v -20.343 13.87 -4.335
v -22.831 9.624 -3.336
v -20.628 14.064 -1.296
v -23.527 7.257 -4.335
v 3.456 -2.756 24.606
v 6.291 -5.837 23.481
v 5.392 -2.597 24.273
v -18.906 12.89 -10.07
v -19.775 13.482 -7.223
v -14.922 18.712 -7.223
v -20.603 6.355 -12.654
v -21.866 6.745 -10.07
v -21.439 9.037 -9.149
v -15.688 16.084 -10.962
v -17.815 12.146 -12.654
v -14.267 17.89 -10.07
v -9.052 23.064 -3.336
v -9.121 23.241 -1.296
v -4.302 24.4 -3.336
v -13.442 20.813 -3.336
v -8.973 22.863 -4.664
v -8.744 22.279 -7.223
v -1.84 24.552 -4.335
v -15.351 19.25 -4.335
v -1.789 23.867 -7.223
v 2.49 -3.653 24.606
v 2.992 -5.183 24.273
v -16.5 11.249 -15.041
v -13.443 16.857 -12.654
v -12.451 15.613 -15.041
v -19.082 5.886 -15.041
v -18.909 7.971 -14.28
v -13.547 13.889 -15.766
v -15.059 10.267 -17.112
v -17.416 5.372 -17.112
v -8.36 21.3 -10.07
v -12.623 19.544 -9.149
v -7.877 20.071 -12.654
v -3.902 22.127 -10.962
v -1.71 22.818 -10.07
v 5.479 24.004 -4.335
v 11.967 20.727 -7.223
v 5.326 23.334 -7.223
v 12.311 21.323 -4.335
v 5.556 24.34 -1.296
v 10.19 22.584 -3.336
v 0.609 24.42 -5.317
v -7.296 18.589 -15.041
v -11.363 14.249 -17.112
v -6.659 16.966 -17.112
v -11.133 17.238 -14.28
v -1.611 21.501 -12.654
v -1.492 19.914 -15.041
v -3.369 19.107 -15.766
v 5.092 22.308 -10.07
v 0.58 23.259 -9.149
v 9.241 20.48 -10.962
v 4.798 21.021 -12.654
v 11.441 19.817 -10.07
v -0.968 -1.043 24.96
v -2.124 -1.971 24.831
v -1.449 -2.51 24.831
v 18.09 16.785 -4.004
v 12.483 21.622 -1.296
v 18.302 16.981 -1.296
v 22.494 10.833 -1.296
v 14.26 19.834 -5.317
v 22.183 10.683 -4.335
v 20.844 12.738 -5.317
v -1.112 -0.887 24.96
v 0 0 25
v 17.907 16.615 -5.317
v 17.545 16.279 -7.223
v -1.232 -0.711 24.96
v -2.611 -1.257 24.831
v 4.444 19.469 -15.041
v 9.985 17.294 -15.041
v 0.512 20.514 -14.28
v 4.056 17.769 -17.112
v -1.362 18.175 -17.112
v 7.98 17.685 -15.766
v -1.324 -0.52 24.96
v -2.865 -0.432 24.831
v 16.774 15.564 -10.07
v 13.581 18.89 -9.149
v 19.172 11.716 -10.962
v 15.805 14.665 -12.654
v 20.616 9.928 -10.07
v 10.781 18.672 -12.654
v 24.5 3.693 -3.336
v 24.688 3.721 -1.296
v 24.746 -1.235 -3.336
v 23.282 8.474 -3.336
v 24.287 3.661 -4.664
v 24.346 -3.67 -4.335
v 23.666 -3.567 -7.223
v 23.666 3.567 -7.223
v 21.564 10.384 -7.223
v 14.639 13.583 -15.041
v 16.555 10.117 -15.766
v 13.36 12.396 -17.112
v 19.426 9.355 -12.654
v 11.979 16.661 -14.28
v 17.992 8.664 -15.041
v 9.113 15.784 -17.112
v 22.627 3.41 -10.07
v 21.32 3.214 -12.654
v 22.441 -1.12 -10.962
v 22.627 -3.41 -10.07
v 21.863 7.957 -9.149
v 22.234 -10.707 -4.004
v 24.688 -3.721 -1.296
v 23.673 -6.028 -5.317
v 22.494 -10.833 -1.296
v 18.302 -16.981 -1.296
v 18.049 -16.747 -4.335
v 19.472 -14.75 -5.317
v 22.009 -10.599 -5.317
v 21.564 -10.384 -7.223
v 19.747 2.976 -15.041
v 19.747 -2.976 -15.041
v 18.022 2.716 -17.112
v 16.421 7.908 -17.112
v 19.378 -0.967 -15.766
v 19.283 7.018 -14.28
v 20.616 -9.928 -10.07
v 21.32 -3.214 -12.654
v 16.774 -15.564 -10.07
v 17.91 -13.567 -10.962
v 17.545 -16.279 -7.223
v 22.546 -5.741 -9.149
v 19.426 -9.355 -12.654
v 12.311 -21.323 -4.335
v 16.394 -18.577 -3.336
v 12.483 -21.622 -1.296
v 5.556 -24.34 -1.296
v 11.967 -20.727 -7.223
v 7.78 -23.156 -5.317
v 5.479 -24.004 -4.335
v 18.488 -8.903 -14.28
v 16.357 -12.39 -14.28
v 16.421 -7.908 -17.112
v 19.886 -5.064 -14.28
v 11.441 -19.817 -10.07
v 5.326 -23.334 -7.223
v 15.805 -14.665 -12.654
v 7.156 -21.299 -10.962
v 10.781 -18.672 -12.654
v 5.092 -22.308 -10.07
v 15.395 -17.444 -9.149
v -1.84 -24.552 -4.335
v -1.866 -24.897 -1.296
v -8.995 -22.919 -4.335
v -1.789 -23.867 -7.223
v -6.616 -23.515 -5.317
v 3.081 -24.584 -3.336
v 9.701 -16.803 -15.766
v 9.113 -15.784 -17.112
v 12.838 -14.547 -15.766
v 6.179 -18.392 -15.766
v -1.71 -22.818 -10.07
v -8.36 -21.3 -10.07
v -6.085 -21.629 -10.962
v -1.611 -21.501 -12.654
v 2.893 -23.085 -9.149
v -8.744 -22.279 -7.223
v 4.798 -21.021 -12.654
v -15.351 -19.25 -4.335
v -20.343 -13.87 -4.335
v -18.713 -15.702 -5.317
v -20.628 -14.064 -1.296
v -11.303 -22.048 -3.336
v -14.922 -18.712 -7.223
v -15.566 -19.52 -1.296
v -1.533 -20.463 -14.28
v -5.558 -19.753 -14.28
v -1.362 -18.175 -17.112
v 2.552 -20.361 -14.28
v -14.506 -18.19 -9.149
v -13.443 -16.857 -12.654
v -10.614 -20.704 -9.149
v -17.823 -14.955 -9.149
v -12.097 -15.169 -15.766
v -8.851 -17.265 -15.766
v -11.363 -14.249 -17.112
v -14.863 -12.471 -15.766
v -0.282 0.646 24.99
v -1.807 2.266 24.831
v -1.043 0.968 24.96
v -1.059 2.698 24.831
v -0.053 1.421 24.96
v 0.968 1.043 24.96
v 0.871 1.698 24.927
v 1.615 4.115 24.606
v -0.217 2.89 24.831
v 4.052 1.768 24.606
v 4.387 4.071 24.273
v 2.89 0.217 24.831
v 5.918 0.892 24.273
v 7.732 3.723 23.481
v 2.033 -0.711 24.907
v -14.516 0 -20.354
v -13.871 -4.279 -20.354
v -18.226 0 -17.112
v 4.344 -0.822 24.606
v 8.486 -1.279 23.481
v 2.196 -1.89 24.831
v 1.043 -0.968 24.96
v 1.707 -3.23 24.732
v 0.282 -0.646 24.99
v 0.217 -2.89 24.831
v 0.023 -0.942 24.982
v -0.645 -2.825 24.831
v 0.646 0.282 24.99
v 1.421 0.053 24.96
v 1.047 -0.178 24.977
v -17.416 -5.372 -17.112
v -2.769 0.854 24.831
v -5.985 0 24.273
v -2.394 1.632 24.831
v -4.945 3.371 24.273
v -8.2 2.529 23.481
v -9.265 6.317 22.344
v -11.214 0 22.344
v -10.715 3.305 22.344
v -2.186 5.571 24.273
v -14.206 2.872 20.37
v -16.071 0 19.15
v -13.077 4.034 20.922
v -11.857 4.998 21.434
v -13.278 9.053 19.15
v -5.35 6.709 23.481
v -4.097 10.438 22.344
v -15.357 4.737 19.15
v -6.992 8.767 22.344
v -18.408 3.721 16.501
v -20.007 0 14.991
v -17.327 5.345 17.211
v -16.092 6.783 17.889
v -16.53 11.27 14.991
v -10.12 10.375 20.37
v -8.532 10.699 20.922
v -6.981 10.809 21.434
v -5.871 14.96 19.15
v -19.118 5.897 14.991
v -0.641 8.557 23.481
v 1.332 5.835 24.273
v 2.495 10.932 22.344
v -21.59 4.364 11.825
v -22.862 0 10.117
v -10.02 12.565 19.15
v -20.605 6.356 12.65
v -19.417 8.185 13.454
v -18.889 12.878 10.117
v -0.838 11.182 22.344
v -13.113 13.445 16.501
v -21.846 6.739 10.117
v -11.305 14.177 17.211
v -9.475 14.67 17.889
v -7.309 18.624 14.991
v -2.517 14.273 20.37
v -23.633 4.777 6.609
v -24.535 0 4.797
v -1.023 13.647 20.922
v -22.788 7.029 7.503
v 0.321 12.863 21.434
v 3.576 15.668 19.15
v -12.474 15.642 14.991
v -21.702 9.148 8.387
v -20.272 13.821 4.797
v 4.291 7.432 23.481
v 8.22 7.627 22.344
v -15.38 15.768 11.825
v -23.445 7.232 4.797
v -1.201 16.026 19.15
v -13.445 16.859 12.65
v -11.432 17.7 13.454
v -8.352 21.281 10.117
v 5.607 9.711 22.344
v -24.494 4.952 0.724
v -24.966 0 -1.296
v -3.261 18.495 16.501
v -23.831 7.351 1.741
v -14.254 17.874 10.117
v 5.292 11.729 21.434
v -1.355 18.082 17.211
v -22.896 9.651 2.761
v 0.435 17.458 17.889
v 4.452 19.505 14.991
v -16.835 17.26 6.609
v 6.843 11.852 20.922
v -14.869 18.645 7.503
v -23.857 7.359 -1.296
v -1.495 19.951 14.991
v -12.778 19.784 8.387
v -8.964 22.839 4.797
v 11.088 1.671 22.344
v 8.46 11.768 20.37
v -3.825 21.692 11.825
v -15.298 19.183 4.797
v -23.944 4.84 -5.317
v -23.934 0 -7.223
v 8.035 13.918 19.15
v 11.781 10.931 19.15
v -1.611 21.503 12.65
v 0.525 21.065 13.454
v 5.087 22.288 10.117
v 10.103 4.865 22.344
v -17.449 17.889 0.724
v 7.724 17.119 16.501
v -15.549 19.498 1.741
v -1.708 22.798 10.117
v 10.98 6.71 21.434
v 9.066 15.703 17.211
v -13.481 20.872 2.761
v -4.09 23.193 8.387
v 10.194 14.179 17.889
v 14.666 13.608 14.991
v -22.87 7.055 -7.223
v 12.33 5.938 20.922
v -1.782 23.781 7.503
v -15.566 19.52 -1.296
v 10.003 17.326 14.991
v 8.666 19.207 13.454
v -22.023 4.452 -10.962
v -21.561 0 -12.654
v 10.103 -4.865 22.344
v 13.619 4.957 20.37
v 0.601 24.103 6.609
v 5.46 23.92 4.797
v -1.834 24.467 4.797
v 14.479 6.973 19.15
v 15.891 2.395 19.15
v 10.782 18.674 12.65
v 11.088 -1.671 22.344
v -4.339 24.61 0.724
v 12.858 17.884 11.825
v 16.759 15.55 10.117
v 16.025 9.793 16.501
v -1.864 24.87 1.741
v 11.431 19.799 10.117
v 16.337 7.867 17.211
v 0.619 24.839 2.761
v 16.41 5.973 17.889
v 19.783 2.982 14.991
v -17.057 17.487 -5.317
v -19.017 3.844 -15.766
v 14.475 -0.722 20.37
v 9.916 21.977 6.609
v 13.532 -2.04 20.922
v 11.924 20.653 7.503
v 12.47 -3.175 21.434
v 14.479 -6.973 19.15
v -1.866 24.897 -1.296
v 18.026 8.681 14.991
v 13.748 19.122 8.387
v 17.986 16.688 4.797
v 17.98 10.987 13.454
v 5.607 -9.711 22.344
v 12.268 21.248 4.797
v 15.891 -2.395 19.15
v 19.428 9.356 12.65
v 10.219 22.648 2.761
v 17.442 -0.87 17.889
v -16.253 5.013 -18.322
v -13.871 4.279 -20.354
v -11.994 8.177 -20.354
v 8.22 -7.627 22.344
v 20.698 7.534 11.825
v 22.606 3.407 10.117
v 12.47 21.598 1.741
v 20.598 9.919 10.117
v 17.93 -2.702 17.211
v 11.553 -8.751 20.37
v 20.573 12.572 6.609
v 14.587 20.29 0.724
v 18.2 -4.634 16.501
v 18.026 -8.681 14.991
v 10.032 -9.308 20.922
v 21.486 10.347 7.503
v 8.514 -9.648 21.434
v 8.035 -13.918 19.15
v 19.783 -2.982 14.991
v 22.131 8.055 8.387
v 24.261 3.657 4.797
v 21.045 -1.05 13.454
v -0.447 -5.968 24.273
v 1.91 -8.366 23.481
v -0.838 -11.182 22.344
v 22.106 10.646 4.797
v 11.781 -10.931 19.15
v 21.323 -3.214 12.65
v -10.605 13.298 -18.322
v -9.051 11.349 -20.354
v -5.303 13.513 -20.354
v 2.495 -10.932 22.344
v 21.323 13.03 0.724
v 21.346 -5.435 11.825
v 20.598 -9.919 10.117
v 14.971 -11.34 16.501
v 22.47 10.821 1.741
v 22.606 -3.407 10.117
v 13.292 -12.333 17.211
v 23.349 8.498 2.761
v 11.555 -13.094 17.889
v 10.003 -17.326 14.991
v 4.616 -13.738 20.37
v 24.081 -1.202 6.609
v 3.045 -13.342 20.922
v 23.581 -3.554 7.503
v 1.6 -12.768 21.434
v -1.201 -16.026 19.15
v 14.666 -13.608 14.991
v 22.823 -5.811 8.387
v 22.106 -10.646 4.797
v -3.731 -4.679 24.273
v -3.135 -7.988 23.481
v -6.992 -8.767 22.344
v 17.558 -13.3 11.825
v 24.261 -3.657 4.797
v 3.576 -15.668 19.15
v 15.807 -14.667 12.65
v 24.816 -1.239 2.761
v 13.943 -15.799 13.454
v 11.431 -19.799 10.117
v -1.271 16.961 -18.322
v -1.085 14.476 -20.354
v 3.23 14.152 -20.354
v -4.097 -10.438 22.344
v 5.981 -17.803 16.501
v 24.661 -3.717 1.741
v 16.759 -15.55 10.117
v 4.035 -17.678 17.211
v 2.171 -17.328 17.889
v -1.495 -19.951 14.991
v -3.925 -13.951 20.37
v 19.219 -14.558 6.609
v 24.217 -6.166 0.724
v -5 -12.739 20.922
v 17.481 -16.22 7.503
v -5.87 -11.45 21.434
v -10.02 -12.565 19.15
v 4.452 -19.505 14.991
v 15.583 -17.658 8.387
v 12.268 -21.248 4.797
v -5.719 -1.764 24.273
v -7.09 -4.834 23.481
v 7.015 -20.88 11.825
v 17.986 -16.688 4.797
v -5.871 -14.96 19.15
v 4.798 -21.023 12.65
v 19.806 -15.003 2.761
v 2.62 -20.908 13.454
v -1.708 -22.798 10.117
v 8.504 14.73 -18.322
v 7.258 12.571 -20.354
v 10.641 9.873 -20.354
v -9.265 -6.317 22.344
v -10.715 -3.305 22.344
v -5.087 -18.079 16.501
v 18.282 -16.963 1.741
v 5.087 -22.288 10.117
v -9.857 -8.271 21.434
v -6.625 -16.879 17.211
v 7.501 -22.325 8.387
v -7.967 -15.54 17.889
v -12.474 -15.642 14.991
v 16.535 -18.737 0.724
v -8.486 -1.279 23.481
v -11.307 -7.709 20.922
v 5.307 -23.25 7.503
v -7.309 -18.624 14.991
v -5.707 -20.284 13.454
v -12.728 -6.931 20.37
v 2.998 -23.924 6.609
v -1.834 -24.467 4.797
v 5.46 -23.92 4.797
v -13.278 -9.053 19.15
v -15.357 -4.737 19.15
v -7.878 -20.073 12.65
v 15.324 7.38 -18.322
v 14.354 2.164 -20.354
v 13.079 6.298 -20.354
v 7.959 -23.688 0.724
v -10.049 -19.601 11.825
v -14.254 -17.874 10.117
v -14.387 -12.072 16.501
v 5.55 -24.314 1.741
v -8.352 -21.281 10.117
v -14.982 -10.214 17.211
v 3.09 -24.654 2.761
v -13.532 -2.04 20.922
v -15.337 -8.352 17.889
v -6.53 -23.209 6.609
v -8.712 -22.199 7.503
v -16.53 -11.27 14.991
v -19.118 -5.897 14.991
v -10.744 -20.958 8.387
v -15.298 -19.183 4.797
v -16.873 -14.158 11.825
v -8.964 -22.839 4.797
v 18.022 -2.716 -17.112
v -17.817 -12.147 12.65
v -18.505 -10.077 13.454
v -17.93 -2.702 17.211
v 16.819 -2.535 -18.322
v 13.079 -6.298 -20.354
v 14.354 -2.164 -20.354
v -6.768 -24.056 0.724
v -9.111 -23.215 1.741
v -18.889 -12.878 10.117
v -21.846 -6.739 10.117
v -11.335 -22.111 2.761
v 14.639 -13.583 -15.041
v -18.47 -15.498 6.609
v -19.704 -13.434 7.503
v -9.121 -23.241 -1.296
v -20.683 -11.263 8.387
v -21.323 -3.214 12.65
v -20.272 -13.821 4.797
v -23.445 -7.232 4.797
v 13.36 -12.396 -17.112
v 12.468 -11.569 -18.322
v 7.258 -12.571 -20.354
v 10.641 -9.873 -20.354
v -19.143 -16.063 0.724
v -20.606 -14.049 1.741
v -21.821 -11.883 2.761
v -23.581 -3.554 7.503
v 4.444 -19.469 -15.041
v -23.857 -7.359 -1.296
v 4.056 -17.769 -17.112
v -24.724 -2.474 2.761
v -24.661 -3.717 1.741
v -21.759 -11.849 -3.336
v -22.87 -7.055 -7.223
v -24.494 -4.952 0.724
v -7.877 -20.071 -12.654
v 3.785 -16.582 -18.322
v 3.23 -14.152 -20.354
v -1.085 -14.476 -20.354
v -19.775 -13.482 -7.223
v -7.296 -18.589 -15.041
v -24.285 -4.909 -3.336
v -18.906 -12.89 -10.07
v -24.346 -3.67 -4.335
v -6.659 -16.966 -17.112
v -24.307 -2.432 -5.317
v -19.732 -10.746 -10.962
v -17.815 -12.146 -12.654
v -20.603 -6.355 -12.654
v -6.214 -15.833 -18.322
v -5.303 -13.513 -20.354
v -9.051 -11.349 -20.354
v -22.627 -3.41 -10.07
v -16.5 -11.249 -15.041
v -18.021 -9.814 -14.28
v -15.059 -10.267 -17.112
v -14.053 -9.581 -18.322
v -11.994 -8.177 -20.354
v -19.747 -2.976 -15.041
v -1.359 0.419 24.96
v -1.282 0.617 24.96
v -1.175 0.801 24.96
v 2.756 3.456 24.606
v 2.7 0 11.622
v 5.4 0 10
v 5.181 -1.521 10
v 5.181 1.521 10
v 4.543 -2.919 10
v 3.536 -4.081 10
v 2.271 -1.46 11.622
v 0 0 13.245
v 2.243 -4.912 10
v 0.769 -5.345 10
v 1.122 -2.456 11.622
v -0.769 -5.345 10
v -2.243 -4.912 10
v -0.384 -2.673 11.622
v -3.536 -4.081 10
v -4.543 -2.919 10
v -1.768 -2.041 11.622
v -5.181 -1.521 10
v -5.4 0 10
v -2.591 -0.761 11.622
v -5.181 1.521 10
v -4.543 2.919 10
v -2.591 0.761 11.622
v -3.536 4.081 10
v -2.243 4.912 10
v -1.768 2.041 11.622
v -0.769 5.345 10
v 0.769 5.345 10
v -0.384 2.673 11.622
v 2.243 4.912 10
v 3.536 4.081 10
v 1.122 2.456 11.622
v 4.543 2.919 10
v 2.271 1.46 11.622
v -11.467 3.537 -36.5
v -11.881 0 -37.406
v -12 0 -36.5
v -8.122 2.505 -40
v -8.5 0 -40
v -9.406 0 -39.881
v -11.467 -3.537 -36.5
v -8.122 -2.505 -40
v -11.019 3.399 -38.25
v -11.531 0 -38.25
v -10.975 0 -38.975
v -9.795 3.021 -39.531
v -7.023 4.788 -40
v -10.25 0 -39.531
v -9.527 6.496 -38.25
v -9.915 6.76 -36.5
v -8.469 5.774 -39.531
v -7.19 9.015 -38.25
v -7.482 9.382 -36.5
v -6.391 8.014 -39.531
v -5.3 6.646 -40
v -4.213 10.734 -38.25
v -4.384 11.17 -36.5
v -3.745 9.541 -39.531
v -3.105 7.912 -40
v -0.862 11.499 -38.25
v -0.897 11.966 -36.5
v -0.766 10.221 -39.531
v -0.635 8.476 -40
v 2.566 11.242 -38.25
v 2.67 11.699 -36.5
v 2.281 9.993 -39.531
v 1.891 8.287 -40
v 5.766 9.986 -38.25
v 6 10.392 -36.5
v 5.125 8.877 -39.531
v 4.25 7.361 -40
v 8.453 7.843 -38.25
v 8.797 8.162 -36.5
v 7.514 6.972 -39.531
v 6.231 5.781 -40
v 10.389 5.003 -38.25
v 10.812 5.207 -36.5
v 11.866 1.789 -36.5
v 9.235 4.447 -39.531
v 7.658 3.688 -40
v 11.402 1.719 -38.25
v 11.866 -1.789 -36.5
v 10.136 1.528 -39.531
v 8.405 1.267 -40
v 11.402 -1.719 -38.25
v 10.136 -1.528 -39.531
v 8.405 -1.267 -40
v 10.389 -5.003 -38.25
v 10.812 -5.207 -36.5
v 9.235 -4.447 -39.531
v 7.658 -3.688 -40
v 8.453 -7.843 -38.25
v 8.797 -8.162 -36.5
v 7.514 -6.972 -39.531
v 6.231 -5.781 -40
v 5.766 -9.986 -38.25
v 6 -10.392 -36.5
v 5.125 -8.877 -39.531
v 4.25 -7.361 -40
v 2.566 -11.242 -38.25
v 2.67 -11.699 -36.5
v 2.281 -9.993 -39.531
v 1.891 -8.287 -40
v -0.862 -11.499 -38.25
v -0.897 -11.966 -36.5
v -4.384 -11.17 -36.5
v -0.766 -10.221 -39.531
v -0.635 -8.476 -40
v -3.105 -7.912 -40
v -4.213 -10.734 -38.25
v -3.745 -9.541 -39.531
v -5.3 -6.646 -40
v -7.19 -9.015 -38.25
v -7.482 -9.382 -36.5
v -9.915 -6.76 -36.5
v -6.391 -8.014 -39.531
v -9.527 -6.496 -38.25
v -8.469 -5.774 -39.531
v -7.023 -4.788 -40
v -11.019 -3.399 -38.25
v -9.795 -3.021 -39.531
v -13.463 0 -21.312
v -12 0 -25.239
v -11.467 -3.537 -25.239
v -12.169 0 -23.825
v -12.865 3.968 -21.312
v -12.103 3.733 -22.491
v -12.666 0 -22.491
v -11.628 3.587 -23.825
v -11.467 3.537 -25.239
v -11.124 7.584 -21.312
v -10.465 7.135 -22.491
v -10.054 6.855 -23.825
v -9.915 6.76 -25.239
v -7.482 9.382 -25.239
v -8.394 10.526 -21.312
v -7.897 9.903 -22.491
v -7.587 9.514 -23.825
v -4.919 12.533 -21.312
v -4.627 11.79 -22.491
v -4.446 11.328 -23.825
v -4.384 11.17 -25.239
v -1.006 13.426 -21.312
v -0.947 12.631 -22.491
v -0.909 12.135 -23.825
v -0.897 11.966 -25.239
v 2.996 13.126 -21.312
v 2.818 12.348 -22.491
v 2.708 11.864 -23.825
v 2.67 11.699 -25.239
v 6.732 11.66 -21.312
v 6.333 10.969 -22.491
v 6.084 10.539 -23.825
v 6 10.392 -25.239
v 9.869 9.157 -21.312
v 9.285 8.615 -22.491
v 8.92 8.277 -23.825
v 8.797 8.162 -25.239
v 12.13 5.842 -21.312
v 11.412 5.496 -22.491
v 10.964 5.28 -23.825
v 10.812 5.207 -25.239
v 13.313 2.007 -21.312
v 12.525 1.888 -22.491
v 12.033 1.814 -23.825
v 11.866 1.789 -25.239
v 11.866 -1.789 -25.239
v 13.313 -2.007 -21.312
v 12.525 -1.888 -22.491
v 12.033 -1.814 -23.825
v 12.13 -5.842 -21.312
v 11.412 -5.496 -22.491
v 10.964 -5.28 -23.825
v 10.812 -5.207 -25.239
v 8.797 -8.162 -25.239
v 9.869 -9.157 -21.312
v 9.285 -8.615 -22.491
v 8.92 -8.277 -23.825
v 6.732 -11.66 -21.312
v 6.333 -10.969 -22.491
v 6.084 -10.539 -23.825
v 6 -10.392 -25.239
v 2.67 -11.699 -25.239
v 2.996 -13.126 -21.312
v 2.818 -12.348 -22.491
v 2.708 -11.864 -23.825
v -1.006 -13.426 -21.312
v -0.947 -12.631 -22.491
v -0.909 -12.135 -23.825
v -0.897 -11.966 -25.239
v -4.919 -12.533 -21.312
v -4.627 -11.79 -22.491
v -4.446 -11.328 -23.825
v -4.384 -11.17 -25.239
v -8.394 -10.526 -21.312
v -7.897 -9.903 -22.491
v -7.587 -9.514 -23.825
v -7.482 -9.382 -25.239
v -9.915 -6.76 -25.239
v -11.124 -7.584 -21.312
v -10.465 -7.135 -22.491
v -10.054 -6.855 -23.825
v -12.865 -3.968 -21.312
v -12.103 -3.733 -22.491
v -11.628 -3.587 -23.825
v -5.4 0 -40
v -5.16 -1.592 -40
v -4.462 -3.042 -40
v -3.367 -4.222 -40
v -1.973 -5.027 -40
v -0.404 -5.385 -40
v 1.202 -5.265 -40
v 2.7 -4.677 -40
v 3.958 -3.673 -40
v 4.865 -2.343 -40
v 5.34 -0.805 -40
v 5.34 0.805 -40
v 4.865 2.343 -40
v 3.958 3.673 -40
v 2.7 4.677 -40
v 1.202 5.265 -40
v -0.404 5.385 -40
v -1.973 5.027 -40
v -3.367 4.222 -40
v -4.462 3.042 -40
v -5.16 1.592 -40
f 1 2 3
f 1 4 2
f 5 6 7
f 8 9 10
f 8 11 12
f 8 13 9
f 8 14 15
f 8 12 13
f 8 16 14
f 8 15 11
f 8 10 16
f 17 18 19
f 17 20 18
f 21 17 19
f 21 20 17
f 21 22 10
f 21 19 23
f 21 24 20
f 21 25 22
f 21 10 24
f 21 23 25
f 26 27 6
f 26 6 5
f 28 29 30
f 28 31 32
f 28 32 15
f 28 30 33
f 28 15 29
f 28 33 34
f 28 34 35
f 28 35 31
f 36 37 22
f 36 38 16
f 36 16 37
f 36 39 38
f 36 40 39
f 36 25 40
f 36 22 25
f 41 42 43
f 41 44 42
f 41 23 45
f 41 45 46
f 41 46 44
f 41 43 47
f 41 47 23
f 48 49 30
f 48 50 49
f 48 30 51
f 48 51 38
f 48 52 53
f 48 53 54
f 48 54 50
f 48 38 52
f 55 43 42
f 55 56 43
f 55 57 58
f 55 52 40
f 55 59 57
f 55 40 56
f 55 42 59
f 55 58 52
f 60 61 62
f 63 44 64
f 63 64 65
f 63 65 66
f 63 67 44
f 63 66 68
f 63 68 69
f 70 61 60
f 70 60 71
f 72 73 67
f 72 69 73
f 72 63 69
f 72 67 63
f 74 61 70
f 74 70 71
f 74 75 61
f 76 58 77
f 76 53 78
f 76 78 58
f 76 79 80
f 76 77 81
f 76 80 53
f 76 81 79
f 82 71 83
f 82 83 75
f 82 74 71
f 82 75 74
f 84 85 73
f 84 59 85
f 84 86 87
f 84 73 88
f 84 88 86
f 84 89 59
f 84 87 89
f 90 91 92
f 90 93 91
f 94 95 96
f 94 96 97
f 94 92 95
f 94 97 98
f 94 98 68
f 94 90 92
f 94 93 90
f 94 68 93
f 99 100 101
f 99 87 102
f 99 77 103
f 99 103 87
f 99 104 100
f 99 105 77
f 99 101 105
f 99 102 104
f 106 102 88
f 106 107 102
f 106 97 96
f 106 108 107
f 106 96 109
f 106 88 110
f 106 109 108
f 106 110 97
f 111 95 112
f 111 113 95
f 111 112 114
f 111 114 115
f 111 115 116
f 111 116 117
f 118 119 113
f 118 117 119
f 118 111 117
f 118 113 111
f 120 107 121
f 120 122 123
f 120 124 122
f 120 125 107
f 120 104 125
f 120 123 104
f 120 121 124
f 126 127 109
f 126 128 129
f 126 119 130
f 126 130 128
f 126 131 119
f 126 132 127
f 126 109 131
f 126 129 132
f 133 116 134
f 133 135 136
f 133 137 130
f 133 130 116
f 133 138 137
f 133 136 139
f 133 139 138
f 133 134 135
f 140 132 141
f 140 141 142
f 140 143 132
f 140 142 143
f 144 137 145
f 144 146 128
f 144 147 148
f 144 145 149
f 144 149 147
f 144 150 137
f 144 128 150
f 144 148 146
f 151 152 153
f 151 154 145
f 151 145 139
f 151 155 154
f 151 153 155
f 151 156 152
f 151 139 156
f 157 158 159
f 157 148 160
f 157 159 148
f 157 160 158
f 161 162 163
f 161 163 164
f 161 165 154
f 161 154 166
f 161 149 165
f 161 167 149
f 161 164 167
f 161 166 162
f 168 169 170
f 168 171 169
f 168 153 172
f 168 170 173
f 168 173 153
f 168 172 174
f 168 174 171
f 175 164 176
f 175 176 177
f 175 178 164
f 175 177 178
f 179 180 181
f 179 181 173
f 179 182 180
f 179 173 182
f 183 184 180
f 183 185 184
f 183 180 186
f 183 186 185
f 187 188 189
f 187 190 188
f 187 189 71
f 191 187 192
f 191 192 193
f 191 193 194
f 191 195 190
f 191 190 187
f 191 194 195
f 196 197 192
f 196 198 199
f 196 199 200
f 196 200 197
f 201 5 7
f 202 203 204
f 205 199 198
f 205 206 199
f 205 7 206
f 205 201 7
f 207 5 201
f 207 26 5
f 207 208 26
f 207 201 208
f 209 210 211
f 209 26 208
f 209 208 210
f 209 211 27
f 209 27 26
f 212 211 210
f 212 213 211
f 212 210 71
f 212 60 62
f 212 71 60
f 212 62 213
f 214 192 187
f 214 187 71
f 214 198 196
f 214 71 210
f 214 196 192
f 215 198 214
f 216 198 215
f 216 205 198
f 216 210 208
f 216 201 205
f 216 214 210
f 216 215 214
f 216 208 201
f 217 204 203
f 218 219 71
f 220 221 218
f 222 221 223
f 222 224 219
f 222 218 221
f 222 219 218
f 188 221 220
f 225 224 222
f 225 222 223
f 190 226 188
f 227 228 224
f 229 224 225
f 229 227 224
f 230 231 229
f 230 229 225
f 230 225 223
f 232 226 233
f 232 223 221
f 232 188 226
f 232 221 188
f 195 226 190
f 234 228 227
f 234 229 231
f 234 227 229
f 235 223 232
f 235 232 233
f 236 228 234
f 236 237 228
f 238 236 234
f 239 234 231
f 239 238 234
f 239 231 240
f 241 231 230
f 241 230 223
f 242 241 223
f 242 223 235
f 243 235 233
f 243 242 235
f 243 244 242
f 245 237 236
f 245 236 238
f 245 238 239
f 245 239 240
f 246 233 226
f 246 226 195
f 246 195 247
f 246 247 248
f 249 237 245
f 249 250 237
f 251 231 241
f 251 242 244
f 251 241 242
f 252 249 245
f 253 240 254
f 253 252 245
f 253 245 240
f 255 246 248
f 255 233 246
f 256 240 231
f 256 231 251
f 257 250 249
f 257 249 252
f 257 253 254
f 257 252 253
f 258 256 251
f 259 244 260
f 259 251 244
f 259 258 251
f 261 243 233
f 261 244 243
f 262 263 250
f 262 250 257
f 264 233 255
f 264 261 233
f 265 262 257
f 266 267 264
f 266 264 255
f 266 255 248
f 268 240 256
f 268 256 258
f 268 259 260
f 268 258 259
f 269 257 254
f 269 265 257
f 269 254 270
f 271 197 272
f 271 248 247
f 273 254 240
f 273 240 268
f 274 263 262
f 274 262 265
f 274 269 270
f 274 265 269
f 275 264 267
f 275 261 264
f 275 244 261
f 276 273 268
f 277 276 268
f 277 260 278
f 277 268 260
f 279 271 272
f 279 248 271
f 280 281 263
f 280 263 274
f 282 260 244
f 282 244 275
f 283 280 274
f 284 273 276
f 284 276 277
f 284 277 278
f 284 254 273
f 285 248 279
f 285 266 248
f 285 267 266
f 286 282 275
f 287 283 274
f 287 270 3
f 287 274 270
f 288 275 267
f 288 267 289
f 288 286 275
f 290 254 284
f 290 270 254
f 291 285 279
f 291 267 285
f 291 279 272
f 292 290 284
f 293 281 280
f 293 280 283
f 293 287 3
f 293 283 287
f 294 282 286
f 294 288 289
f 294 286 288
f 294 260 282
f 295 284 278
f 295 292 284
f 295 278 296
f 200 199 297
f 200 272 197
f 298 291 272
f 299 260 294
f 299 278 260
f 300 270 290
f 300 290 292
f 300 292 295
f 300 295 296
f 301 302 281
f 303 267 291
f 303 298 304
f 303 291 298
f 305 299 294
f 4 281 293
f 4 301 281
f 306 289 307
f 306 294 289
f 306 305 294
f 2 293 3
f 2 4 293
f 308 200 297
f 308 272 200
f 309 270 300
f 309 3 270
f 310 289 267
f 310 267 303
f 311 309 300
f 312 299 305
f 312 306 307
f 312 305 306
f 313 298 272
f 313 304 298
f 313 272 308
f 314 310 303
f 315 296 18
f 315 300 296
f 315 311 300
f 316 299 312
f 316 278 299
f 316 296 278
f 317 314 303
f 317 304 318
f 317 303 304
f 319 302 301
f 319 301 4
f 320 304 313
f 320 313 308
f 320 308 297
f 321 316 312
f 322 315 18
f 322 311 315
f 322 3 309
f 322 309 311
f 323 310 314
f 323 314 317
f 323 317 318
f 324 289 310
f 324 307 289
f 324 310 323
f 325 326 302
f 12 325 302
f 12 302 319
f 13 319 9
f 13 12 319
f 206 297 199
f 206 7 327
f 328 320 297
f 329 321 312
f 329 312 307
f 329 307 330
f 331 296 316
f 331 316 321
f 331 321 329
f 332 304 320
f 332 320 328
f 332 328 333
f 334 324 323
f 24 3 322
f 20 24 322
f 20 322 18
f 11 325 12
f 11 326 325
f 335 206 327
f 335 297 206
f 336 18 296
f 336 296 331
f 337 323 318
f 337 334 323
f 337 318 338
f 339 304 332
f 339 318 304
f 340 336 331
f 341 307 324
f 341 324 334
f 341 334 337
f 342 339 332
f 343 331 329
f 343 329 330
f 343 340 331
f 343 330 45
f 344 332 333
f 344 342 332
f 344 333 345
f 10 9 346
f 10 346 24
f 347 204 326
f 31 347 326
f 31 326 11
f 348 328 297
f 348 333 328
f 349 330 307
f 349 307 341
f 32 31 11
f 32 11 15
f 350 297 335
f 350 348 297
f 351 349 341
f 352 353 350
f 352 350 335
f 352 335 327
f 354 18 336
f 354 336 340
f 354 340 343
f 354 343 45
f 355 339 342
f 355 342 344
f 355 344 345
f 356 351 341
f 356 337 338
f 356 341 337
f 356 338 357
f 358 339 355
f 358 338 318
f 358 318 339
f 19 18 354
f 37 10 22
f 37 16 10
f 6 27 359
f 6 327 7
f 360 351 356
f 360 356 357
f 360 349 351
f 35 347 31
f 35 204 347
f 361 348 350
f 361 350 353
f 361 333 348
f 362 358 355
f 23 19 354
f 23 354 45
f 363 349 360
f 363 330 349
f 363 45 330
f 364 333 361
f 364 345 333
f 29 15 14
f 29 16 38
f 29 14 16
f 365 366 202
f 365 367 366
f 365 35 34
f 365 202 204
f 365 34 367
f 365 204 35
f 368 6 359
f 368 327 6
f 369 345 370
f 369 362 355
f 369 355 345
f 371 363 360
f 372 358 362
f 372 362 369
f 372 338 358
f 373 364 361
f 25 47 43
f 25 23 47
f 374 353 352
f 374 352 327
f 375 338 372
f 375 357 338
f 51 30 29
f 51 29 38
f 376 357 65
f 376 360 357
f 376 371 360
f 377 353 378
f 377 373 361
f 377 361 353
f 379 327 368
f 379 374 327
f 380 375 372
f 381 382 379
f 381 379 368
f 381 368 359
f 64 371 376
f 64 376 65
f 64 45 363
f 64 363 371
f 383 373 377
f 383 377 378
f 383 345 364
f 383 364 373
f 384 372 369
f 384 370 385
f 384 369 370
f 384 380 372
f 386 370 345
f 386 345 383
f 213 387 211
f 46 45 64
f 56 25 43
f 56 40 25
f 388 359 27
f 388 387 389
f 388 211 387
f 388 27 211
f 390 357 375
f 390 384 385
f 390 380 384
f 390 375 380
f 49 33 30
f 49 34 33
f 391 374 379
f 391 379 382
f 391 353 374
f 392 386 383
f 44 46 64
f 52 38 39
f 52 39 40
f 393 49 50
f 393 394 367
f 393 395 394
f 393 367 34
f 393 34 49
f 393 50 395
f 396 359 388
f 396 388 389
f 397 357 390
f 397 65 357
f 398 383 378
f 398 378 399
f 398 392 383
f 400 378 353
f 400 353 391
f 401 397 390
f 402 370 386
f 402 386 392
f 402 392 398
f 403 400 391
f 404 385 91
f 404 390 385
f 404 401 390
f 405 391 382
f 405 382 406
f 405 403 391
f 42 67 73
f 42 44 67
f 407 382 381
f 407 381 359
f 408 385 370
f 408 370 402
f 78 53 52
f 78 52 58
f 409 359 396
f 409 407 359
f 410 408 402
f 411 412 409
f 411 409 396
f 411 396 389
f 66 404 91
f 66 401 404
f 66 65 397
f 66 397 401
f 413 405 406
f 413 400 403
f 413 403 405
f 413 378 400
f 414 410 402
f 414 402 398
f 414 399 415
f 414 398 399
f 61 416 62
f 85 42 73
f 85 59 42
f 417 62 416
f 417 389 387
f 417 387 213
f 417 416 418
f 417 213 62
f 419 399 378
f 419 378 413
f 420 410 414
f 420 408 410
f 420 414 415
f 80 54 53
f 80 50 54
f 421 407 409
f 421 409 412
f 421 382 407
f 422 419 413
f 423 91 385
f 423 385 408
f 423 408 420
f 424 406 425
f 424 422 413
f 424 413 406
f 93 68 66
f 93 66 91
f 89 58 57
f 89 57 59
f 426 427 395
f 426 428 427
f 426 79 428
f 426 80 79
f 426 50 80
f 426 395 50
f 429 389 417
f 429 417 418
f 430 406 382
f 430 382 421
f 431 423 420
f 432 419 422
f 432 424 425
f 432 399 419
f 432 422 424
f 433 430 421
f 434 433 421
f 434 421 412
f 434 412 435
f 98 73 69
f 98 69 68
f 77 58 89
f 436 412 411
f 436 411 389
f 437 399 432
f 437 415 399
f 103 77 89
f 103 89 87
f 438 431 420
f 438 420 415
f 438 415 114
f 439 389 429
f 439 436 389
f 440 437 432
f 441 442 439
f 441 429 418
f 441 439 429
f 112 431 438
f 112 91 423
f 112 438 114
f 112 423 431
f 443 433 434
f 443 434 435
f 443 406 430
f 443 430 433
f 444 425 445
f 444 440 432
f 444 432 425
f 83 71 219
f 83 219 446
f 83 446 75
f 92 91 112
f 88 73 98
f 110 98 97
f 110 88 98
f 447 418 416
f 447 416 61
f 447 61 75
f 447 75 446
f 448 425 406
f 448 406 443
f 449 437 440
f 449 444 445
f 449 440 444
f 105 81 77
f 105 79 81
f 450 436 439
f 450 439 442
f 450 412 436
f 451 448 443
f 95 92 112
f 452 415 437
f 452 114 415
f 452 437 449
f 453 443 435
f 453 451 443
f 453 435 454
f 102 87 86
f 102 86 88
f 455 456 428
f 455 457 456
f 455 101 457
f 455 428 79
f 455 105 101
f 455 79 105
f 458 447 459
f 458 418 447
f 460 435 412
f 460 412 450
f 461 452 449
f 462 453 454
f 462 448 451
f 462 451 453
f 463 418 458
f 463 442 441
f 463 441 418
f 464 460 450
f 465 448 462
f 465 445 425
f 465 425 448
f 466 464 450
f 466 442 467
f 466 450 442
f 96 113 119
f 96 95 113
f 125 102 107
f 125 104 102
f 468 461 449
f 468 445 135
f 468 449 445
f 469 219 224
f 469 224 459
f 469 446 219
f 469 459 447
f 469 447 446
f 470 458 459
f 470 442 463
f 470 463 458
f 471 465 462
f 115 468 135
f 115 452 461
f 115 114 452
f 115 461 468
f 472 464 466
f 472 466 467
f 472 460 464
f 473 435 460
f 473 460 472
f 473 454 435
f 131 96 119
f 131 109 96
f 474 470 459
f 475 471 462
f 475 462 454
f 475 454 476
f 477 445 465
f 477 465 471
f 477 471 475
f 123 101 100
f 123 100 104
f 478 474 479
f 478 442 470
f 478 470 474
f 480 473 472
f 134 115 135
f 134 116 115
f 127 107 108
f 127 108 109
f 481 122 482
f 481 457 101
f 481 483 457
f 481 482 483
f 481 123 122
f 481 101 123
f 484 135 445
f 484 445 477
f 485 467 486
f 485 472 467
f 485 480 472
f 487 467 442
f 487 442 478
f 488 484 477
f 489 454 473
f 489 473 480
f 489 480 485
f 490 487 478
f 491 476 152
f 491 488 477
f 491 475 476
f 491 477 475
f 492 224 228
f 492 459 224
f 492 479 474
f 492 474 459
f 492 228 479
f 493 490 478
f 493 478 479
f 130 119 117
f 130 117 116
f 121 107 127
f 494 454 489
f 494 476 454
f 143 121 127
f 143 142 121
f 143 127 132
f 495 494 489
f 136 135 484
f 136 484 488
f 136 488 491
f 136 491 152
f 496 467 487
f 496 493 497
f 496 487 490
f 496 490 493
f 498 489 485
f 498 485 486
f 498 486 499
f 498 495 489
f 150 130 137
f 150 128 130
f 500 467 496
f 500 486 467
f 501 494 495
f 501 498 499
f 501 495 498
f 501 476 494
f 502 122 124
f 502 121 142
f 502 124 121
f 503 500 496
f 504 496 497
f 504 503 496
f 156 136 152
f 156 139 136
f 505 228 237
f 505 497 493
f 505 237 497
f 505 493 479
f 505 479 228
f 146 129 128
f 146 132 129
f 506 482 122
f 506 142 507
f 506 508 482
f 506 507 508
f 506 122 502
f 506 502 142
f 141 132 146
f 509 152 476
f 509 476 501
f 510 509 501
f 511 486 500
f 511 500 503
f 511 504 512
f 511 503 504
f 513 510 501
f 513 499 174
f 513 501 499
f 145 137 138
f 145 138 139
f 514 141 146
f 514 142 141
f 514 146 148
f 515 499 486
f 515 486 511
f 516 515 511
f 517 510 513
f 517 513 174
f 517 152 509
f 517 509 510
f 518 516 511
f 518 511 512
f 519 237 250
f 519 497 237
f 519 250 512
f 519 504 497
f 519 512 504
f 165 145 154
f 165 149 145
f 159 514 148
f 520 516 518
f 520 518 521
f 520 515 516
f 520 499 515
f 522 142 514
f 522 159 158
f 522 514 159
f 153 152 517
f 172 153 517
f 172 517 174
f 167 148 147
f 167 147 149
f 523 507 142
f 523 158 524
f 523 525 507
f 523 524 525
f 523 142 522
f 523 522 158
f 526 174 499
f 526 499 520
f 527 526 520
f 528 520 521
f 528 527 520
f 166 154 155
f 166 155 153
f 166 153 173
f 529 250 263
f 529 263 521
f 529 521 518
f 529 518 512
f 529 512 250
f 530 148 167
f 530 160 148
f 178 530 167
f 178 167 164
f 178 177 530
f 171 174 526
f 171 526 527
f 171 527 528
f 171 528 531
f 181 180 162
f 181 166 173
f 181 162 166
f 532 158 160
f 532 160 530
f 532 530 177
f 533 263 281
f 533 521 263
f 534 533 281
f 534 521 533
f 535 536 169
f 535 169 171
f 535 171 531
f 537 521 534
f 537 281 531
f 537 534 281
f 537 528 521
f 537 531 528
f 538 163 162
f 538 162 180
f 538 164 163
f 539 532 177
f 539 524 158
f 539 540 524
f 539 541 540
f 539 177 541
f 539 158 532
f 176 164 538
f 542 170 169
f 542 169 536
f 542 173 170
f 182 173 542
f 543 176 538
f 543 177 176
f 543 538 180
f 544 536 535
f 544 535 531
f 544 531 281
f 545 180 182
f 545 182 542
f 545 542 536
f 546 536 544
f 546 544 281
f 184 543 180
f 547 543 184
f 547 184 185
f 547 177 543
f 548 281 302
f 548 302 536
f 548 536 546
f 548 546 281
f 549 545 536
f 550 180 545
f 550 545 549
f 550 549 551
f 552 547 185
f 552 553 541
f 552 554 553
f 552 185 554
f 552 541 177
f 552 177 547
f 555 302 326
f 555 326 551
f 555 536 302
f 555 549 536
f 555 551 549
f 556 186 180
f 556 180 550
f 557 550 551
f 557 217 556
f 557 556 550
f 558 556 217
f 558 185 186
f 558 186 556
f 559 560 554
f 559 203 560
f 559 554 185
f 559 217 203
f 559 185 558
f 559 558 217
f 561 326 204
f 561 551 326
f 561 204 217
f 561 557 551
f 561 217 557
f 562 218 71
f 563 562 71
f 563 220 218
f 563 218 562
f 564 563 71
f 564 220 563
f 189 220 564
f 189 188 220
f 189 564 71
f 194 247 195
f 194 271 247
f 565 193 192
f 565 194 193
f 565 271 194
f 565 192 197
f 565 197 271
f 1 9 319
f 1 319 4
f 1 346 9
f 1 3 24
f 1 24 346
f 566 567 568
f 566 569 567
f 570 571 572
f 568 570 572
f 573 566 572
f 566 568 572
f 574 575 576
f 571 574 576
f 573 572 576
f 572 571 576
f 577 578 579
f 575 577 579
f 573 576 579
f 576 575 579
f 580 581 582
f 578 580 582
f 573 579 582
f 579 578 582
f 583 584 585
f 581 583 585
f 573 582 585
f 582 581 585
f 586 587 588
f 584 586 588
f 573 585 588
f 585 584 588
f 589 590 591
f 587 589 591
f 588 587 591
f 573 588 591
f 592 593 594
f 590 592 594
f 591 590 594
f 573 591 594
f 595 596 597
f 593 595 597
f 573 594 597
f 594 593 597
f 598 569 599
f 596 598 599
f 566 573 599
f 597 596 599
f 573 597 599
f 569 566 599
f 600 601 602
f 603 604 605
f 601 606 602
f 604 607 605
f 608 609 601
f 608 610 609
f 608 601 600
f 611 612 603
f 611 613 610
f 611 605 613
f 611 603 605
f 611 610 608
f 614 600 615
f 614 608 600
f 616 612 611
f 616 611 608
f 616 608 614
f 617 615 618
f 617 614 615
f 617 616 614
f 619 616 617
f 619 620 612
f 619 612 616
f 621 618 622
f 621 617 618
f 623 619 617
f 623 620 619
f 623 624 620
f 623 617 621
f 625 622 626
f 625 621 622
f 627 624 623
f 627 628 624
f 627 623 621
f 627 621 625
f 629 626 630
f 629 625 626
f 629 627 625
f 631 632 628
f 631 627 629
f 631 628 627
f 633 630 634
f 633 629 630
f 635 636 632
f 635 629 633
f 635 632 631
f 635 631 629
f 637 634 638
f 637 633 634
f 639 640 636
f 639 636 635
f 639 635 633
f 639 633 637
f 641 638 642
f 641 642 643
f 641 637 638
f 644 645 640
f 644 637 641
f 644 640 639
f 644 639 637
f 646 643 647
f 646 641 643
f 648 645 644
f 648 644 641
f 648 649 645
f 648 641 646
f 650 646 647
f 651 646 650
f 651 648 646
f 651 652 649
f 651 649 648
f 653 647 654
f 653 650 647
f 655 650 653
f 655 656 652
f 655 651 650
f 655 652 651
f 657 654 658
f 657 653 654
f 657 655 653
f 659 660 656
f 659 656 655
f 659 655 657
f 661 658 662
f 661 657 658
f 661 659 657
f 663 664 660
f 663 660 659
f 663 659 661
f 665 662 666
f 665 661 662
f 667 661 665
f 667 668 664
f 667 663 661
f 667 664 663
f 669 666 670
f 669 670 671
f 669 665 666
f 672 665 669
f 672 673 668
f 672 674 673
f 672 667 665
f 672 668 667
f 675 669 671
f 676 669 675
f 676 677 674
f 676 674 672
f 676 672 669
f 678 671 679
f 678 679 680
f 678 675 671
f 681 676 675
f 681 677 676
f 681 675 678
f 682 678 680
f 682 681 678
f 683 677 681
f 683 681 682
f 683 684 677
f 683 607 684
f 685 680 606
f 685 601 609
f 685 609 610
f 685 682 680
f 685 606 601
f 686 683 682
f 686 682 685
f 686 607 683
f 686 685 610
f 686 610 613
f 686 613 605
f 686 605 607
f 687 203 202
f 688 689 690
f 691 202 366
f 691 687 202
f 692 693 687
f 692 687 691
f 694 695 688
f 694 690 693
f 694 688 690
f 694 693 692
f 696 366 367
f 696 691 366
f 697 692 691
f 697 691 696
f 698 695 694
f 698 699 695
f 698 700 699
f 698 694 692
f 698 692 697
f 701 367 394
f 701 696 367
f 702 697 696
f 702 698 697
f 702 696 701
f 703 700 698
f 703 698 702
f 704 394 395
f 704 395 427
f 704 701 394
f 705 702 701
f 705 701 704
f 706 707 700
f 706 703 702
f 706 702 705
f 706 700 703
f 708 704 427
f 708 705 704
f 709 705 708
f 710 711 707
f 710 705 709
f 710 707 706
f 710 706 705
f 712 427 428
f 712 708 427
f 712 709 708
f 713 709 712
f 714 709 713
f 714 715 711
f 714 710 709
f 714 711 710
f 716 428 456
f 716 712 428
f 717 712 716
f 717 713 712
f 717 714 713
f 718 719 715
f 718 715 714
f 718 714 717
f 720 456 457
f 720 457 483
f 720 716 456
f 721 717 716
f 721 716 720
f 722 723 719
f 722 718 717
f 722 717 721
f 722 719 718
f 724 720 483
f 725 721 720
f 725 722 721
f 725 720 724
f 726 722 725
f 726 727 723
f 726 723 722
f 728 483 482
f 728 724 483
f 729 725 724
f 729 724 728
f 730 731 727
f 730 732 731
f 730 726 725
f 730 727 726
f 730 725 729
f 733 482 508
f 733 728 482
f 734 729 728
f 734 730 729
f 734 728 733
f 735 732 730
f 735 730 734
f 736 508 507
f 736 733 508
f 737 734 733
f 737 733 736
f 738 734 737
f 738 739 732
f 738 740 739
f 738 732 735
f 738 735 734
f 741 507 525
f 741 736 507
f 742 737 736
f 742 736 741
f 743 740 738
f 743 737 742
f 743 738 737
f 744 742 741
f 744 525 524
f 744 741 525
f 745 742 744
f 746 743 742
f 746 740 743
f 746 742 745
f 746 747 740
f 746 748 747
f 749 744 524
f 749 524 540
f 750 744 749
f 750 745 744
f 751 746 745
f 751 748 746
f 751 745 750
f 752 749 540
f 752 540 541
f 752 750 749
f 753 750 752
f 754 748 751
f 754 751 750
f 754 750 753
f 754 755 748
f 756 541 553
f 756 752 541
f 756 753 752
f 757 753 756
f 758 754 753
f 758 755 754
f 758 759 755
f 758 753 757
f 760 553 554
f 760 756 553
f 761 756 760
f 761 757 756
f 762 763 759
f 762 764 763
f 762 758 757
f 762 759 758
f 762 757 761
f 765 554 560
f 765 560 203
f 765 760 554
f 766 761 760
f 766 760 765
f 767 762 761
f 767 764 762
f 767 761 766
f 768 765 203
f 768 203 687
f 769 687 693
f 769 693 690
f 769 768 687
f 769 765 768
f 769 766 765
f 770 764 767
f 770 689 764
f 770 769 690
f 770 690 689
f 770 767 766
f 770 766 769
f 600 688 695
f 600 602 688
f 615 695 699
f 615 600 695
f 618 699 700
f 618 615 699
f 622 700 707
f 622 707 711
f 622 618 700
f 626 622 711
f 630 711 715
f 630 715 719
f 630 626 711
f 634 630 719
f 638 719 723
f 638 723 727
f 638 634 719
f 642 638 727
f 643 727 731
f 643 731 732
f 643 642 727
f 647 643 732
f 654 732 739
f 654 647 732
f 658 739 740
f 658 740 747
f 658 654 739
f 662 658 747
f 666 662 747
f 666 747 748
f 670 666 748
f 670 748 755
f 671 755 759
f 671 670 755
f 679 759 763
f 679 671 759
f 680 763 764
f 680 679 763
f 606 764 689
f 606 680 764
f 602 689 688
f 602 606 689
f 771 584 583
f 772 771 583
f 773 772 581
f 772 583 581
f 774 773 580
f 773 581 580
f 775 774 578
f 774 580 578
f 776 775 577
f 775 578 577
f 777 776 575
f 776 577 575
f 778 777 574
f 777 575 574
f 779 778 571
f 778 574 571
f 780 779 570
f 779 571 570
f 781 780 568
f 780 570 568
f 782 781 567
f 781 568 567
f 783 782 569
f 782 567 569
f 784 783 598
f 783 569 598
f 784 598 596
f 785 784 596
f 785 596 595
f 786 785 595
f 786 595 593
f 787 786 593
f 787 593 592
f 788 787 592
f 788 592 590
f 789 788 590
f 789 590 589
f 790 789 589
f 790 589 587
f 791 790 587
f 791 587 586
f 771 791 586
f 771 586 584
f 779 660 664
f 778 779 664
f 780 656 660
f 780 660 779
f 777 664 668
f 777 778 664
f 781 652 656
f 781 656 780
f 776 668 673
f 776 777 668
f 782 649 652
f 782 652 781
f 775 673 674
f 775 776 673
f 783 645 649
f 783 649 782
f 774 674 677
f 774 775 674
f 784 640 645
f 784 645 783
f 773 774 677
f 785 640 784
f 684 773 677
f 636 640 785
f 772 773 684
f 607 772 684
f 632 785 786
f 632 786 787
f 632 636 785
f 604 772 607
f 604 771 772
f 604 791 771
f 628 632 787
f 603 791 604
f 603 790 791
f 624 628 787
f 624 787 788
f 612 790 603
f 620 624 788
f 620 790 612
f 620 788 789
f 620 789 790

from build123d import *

# Parameters (mm, degrees)
F3_D           = 10.8
F3_DEPTH       = 50
F3_CBORE_D     = 10.8
F3_CBORE_DEPTH = 10.8
F3_TIP         = 3.2446473427


with BuildPart() as f1:
    # F0 (on Front) → F1 (revolve)
    with BuildSketch(Plane.XZ):
        with BuildLine():
            Line((0, -40), (0, 25))
            add(Edge.make_bspline(
                [(0, 25), (-78.1095262892, 25), (-14.5161290323, -20.3539184905)],
                knots=[4.7123889804, 4.7123889804, 4.7123889804, 7.2344607382, 7.2344607382, 7.2344607382], degree=2, weights=[1, 0.3048304942, 1]))
            ThreePointArc((-14.5161290323, -20.3539184905), (-12.665994666, -22.4914261089), (-12, -25.2388589282))
            Line((-12, -25.2388589282), (-12, -36.5))
            ThreePointArc((-12, -36.5), (-10.9748737342, -38.9748737342), (-8.5, -40))
            Line((-8.5, -40), (0, -40))
        make_face()
    revolve(axis=Axis((0, 0, -7.5), (0, 0, -1)))

    # F3
    with Locations(Plane(origin=(0, 0, -40), x_dir=(1, 0, 0), z_dir=(0, 0, -1))):
        with Locations((0, 0)):
            CounterBoreHole(F3_D / 2, F3_CBORE_D / 2, F3_CBORE_DEPTH, depth=F3_DEPTH)
            with Locations((0, 0, -(F3_DEPTH + F3_TIP / 2))):  # 118° drill point
                Cone(0, F3_D / 2, F3_TIP, mode=Mode.SUBTRACT)


solid = f1.part
